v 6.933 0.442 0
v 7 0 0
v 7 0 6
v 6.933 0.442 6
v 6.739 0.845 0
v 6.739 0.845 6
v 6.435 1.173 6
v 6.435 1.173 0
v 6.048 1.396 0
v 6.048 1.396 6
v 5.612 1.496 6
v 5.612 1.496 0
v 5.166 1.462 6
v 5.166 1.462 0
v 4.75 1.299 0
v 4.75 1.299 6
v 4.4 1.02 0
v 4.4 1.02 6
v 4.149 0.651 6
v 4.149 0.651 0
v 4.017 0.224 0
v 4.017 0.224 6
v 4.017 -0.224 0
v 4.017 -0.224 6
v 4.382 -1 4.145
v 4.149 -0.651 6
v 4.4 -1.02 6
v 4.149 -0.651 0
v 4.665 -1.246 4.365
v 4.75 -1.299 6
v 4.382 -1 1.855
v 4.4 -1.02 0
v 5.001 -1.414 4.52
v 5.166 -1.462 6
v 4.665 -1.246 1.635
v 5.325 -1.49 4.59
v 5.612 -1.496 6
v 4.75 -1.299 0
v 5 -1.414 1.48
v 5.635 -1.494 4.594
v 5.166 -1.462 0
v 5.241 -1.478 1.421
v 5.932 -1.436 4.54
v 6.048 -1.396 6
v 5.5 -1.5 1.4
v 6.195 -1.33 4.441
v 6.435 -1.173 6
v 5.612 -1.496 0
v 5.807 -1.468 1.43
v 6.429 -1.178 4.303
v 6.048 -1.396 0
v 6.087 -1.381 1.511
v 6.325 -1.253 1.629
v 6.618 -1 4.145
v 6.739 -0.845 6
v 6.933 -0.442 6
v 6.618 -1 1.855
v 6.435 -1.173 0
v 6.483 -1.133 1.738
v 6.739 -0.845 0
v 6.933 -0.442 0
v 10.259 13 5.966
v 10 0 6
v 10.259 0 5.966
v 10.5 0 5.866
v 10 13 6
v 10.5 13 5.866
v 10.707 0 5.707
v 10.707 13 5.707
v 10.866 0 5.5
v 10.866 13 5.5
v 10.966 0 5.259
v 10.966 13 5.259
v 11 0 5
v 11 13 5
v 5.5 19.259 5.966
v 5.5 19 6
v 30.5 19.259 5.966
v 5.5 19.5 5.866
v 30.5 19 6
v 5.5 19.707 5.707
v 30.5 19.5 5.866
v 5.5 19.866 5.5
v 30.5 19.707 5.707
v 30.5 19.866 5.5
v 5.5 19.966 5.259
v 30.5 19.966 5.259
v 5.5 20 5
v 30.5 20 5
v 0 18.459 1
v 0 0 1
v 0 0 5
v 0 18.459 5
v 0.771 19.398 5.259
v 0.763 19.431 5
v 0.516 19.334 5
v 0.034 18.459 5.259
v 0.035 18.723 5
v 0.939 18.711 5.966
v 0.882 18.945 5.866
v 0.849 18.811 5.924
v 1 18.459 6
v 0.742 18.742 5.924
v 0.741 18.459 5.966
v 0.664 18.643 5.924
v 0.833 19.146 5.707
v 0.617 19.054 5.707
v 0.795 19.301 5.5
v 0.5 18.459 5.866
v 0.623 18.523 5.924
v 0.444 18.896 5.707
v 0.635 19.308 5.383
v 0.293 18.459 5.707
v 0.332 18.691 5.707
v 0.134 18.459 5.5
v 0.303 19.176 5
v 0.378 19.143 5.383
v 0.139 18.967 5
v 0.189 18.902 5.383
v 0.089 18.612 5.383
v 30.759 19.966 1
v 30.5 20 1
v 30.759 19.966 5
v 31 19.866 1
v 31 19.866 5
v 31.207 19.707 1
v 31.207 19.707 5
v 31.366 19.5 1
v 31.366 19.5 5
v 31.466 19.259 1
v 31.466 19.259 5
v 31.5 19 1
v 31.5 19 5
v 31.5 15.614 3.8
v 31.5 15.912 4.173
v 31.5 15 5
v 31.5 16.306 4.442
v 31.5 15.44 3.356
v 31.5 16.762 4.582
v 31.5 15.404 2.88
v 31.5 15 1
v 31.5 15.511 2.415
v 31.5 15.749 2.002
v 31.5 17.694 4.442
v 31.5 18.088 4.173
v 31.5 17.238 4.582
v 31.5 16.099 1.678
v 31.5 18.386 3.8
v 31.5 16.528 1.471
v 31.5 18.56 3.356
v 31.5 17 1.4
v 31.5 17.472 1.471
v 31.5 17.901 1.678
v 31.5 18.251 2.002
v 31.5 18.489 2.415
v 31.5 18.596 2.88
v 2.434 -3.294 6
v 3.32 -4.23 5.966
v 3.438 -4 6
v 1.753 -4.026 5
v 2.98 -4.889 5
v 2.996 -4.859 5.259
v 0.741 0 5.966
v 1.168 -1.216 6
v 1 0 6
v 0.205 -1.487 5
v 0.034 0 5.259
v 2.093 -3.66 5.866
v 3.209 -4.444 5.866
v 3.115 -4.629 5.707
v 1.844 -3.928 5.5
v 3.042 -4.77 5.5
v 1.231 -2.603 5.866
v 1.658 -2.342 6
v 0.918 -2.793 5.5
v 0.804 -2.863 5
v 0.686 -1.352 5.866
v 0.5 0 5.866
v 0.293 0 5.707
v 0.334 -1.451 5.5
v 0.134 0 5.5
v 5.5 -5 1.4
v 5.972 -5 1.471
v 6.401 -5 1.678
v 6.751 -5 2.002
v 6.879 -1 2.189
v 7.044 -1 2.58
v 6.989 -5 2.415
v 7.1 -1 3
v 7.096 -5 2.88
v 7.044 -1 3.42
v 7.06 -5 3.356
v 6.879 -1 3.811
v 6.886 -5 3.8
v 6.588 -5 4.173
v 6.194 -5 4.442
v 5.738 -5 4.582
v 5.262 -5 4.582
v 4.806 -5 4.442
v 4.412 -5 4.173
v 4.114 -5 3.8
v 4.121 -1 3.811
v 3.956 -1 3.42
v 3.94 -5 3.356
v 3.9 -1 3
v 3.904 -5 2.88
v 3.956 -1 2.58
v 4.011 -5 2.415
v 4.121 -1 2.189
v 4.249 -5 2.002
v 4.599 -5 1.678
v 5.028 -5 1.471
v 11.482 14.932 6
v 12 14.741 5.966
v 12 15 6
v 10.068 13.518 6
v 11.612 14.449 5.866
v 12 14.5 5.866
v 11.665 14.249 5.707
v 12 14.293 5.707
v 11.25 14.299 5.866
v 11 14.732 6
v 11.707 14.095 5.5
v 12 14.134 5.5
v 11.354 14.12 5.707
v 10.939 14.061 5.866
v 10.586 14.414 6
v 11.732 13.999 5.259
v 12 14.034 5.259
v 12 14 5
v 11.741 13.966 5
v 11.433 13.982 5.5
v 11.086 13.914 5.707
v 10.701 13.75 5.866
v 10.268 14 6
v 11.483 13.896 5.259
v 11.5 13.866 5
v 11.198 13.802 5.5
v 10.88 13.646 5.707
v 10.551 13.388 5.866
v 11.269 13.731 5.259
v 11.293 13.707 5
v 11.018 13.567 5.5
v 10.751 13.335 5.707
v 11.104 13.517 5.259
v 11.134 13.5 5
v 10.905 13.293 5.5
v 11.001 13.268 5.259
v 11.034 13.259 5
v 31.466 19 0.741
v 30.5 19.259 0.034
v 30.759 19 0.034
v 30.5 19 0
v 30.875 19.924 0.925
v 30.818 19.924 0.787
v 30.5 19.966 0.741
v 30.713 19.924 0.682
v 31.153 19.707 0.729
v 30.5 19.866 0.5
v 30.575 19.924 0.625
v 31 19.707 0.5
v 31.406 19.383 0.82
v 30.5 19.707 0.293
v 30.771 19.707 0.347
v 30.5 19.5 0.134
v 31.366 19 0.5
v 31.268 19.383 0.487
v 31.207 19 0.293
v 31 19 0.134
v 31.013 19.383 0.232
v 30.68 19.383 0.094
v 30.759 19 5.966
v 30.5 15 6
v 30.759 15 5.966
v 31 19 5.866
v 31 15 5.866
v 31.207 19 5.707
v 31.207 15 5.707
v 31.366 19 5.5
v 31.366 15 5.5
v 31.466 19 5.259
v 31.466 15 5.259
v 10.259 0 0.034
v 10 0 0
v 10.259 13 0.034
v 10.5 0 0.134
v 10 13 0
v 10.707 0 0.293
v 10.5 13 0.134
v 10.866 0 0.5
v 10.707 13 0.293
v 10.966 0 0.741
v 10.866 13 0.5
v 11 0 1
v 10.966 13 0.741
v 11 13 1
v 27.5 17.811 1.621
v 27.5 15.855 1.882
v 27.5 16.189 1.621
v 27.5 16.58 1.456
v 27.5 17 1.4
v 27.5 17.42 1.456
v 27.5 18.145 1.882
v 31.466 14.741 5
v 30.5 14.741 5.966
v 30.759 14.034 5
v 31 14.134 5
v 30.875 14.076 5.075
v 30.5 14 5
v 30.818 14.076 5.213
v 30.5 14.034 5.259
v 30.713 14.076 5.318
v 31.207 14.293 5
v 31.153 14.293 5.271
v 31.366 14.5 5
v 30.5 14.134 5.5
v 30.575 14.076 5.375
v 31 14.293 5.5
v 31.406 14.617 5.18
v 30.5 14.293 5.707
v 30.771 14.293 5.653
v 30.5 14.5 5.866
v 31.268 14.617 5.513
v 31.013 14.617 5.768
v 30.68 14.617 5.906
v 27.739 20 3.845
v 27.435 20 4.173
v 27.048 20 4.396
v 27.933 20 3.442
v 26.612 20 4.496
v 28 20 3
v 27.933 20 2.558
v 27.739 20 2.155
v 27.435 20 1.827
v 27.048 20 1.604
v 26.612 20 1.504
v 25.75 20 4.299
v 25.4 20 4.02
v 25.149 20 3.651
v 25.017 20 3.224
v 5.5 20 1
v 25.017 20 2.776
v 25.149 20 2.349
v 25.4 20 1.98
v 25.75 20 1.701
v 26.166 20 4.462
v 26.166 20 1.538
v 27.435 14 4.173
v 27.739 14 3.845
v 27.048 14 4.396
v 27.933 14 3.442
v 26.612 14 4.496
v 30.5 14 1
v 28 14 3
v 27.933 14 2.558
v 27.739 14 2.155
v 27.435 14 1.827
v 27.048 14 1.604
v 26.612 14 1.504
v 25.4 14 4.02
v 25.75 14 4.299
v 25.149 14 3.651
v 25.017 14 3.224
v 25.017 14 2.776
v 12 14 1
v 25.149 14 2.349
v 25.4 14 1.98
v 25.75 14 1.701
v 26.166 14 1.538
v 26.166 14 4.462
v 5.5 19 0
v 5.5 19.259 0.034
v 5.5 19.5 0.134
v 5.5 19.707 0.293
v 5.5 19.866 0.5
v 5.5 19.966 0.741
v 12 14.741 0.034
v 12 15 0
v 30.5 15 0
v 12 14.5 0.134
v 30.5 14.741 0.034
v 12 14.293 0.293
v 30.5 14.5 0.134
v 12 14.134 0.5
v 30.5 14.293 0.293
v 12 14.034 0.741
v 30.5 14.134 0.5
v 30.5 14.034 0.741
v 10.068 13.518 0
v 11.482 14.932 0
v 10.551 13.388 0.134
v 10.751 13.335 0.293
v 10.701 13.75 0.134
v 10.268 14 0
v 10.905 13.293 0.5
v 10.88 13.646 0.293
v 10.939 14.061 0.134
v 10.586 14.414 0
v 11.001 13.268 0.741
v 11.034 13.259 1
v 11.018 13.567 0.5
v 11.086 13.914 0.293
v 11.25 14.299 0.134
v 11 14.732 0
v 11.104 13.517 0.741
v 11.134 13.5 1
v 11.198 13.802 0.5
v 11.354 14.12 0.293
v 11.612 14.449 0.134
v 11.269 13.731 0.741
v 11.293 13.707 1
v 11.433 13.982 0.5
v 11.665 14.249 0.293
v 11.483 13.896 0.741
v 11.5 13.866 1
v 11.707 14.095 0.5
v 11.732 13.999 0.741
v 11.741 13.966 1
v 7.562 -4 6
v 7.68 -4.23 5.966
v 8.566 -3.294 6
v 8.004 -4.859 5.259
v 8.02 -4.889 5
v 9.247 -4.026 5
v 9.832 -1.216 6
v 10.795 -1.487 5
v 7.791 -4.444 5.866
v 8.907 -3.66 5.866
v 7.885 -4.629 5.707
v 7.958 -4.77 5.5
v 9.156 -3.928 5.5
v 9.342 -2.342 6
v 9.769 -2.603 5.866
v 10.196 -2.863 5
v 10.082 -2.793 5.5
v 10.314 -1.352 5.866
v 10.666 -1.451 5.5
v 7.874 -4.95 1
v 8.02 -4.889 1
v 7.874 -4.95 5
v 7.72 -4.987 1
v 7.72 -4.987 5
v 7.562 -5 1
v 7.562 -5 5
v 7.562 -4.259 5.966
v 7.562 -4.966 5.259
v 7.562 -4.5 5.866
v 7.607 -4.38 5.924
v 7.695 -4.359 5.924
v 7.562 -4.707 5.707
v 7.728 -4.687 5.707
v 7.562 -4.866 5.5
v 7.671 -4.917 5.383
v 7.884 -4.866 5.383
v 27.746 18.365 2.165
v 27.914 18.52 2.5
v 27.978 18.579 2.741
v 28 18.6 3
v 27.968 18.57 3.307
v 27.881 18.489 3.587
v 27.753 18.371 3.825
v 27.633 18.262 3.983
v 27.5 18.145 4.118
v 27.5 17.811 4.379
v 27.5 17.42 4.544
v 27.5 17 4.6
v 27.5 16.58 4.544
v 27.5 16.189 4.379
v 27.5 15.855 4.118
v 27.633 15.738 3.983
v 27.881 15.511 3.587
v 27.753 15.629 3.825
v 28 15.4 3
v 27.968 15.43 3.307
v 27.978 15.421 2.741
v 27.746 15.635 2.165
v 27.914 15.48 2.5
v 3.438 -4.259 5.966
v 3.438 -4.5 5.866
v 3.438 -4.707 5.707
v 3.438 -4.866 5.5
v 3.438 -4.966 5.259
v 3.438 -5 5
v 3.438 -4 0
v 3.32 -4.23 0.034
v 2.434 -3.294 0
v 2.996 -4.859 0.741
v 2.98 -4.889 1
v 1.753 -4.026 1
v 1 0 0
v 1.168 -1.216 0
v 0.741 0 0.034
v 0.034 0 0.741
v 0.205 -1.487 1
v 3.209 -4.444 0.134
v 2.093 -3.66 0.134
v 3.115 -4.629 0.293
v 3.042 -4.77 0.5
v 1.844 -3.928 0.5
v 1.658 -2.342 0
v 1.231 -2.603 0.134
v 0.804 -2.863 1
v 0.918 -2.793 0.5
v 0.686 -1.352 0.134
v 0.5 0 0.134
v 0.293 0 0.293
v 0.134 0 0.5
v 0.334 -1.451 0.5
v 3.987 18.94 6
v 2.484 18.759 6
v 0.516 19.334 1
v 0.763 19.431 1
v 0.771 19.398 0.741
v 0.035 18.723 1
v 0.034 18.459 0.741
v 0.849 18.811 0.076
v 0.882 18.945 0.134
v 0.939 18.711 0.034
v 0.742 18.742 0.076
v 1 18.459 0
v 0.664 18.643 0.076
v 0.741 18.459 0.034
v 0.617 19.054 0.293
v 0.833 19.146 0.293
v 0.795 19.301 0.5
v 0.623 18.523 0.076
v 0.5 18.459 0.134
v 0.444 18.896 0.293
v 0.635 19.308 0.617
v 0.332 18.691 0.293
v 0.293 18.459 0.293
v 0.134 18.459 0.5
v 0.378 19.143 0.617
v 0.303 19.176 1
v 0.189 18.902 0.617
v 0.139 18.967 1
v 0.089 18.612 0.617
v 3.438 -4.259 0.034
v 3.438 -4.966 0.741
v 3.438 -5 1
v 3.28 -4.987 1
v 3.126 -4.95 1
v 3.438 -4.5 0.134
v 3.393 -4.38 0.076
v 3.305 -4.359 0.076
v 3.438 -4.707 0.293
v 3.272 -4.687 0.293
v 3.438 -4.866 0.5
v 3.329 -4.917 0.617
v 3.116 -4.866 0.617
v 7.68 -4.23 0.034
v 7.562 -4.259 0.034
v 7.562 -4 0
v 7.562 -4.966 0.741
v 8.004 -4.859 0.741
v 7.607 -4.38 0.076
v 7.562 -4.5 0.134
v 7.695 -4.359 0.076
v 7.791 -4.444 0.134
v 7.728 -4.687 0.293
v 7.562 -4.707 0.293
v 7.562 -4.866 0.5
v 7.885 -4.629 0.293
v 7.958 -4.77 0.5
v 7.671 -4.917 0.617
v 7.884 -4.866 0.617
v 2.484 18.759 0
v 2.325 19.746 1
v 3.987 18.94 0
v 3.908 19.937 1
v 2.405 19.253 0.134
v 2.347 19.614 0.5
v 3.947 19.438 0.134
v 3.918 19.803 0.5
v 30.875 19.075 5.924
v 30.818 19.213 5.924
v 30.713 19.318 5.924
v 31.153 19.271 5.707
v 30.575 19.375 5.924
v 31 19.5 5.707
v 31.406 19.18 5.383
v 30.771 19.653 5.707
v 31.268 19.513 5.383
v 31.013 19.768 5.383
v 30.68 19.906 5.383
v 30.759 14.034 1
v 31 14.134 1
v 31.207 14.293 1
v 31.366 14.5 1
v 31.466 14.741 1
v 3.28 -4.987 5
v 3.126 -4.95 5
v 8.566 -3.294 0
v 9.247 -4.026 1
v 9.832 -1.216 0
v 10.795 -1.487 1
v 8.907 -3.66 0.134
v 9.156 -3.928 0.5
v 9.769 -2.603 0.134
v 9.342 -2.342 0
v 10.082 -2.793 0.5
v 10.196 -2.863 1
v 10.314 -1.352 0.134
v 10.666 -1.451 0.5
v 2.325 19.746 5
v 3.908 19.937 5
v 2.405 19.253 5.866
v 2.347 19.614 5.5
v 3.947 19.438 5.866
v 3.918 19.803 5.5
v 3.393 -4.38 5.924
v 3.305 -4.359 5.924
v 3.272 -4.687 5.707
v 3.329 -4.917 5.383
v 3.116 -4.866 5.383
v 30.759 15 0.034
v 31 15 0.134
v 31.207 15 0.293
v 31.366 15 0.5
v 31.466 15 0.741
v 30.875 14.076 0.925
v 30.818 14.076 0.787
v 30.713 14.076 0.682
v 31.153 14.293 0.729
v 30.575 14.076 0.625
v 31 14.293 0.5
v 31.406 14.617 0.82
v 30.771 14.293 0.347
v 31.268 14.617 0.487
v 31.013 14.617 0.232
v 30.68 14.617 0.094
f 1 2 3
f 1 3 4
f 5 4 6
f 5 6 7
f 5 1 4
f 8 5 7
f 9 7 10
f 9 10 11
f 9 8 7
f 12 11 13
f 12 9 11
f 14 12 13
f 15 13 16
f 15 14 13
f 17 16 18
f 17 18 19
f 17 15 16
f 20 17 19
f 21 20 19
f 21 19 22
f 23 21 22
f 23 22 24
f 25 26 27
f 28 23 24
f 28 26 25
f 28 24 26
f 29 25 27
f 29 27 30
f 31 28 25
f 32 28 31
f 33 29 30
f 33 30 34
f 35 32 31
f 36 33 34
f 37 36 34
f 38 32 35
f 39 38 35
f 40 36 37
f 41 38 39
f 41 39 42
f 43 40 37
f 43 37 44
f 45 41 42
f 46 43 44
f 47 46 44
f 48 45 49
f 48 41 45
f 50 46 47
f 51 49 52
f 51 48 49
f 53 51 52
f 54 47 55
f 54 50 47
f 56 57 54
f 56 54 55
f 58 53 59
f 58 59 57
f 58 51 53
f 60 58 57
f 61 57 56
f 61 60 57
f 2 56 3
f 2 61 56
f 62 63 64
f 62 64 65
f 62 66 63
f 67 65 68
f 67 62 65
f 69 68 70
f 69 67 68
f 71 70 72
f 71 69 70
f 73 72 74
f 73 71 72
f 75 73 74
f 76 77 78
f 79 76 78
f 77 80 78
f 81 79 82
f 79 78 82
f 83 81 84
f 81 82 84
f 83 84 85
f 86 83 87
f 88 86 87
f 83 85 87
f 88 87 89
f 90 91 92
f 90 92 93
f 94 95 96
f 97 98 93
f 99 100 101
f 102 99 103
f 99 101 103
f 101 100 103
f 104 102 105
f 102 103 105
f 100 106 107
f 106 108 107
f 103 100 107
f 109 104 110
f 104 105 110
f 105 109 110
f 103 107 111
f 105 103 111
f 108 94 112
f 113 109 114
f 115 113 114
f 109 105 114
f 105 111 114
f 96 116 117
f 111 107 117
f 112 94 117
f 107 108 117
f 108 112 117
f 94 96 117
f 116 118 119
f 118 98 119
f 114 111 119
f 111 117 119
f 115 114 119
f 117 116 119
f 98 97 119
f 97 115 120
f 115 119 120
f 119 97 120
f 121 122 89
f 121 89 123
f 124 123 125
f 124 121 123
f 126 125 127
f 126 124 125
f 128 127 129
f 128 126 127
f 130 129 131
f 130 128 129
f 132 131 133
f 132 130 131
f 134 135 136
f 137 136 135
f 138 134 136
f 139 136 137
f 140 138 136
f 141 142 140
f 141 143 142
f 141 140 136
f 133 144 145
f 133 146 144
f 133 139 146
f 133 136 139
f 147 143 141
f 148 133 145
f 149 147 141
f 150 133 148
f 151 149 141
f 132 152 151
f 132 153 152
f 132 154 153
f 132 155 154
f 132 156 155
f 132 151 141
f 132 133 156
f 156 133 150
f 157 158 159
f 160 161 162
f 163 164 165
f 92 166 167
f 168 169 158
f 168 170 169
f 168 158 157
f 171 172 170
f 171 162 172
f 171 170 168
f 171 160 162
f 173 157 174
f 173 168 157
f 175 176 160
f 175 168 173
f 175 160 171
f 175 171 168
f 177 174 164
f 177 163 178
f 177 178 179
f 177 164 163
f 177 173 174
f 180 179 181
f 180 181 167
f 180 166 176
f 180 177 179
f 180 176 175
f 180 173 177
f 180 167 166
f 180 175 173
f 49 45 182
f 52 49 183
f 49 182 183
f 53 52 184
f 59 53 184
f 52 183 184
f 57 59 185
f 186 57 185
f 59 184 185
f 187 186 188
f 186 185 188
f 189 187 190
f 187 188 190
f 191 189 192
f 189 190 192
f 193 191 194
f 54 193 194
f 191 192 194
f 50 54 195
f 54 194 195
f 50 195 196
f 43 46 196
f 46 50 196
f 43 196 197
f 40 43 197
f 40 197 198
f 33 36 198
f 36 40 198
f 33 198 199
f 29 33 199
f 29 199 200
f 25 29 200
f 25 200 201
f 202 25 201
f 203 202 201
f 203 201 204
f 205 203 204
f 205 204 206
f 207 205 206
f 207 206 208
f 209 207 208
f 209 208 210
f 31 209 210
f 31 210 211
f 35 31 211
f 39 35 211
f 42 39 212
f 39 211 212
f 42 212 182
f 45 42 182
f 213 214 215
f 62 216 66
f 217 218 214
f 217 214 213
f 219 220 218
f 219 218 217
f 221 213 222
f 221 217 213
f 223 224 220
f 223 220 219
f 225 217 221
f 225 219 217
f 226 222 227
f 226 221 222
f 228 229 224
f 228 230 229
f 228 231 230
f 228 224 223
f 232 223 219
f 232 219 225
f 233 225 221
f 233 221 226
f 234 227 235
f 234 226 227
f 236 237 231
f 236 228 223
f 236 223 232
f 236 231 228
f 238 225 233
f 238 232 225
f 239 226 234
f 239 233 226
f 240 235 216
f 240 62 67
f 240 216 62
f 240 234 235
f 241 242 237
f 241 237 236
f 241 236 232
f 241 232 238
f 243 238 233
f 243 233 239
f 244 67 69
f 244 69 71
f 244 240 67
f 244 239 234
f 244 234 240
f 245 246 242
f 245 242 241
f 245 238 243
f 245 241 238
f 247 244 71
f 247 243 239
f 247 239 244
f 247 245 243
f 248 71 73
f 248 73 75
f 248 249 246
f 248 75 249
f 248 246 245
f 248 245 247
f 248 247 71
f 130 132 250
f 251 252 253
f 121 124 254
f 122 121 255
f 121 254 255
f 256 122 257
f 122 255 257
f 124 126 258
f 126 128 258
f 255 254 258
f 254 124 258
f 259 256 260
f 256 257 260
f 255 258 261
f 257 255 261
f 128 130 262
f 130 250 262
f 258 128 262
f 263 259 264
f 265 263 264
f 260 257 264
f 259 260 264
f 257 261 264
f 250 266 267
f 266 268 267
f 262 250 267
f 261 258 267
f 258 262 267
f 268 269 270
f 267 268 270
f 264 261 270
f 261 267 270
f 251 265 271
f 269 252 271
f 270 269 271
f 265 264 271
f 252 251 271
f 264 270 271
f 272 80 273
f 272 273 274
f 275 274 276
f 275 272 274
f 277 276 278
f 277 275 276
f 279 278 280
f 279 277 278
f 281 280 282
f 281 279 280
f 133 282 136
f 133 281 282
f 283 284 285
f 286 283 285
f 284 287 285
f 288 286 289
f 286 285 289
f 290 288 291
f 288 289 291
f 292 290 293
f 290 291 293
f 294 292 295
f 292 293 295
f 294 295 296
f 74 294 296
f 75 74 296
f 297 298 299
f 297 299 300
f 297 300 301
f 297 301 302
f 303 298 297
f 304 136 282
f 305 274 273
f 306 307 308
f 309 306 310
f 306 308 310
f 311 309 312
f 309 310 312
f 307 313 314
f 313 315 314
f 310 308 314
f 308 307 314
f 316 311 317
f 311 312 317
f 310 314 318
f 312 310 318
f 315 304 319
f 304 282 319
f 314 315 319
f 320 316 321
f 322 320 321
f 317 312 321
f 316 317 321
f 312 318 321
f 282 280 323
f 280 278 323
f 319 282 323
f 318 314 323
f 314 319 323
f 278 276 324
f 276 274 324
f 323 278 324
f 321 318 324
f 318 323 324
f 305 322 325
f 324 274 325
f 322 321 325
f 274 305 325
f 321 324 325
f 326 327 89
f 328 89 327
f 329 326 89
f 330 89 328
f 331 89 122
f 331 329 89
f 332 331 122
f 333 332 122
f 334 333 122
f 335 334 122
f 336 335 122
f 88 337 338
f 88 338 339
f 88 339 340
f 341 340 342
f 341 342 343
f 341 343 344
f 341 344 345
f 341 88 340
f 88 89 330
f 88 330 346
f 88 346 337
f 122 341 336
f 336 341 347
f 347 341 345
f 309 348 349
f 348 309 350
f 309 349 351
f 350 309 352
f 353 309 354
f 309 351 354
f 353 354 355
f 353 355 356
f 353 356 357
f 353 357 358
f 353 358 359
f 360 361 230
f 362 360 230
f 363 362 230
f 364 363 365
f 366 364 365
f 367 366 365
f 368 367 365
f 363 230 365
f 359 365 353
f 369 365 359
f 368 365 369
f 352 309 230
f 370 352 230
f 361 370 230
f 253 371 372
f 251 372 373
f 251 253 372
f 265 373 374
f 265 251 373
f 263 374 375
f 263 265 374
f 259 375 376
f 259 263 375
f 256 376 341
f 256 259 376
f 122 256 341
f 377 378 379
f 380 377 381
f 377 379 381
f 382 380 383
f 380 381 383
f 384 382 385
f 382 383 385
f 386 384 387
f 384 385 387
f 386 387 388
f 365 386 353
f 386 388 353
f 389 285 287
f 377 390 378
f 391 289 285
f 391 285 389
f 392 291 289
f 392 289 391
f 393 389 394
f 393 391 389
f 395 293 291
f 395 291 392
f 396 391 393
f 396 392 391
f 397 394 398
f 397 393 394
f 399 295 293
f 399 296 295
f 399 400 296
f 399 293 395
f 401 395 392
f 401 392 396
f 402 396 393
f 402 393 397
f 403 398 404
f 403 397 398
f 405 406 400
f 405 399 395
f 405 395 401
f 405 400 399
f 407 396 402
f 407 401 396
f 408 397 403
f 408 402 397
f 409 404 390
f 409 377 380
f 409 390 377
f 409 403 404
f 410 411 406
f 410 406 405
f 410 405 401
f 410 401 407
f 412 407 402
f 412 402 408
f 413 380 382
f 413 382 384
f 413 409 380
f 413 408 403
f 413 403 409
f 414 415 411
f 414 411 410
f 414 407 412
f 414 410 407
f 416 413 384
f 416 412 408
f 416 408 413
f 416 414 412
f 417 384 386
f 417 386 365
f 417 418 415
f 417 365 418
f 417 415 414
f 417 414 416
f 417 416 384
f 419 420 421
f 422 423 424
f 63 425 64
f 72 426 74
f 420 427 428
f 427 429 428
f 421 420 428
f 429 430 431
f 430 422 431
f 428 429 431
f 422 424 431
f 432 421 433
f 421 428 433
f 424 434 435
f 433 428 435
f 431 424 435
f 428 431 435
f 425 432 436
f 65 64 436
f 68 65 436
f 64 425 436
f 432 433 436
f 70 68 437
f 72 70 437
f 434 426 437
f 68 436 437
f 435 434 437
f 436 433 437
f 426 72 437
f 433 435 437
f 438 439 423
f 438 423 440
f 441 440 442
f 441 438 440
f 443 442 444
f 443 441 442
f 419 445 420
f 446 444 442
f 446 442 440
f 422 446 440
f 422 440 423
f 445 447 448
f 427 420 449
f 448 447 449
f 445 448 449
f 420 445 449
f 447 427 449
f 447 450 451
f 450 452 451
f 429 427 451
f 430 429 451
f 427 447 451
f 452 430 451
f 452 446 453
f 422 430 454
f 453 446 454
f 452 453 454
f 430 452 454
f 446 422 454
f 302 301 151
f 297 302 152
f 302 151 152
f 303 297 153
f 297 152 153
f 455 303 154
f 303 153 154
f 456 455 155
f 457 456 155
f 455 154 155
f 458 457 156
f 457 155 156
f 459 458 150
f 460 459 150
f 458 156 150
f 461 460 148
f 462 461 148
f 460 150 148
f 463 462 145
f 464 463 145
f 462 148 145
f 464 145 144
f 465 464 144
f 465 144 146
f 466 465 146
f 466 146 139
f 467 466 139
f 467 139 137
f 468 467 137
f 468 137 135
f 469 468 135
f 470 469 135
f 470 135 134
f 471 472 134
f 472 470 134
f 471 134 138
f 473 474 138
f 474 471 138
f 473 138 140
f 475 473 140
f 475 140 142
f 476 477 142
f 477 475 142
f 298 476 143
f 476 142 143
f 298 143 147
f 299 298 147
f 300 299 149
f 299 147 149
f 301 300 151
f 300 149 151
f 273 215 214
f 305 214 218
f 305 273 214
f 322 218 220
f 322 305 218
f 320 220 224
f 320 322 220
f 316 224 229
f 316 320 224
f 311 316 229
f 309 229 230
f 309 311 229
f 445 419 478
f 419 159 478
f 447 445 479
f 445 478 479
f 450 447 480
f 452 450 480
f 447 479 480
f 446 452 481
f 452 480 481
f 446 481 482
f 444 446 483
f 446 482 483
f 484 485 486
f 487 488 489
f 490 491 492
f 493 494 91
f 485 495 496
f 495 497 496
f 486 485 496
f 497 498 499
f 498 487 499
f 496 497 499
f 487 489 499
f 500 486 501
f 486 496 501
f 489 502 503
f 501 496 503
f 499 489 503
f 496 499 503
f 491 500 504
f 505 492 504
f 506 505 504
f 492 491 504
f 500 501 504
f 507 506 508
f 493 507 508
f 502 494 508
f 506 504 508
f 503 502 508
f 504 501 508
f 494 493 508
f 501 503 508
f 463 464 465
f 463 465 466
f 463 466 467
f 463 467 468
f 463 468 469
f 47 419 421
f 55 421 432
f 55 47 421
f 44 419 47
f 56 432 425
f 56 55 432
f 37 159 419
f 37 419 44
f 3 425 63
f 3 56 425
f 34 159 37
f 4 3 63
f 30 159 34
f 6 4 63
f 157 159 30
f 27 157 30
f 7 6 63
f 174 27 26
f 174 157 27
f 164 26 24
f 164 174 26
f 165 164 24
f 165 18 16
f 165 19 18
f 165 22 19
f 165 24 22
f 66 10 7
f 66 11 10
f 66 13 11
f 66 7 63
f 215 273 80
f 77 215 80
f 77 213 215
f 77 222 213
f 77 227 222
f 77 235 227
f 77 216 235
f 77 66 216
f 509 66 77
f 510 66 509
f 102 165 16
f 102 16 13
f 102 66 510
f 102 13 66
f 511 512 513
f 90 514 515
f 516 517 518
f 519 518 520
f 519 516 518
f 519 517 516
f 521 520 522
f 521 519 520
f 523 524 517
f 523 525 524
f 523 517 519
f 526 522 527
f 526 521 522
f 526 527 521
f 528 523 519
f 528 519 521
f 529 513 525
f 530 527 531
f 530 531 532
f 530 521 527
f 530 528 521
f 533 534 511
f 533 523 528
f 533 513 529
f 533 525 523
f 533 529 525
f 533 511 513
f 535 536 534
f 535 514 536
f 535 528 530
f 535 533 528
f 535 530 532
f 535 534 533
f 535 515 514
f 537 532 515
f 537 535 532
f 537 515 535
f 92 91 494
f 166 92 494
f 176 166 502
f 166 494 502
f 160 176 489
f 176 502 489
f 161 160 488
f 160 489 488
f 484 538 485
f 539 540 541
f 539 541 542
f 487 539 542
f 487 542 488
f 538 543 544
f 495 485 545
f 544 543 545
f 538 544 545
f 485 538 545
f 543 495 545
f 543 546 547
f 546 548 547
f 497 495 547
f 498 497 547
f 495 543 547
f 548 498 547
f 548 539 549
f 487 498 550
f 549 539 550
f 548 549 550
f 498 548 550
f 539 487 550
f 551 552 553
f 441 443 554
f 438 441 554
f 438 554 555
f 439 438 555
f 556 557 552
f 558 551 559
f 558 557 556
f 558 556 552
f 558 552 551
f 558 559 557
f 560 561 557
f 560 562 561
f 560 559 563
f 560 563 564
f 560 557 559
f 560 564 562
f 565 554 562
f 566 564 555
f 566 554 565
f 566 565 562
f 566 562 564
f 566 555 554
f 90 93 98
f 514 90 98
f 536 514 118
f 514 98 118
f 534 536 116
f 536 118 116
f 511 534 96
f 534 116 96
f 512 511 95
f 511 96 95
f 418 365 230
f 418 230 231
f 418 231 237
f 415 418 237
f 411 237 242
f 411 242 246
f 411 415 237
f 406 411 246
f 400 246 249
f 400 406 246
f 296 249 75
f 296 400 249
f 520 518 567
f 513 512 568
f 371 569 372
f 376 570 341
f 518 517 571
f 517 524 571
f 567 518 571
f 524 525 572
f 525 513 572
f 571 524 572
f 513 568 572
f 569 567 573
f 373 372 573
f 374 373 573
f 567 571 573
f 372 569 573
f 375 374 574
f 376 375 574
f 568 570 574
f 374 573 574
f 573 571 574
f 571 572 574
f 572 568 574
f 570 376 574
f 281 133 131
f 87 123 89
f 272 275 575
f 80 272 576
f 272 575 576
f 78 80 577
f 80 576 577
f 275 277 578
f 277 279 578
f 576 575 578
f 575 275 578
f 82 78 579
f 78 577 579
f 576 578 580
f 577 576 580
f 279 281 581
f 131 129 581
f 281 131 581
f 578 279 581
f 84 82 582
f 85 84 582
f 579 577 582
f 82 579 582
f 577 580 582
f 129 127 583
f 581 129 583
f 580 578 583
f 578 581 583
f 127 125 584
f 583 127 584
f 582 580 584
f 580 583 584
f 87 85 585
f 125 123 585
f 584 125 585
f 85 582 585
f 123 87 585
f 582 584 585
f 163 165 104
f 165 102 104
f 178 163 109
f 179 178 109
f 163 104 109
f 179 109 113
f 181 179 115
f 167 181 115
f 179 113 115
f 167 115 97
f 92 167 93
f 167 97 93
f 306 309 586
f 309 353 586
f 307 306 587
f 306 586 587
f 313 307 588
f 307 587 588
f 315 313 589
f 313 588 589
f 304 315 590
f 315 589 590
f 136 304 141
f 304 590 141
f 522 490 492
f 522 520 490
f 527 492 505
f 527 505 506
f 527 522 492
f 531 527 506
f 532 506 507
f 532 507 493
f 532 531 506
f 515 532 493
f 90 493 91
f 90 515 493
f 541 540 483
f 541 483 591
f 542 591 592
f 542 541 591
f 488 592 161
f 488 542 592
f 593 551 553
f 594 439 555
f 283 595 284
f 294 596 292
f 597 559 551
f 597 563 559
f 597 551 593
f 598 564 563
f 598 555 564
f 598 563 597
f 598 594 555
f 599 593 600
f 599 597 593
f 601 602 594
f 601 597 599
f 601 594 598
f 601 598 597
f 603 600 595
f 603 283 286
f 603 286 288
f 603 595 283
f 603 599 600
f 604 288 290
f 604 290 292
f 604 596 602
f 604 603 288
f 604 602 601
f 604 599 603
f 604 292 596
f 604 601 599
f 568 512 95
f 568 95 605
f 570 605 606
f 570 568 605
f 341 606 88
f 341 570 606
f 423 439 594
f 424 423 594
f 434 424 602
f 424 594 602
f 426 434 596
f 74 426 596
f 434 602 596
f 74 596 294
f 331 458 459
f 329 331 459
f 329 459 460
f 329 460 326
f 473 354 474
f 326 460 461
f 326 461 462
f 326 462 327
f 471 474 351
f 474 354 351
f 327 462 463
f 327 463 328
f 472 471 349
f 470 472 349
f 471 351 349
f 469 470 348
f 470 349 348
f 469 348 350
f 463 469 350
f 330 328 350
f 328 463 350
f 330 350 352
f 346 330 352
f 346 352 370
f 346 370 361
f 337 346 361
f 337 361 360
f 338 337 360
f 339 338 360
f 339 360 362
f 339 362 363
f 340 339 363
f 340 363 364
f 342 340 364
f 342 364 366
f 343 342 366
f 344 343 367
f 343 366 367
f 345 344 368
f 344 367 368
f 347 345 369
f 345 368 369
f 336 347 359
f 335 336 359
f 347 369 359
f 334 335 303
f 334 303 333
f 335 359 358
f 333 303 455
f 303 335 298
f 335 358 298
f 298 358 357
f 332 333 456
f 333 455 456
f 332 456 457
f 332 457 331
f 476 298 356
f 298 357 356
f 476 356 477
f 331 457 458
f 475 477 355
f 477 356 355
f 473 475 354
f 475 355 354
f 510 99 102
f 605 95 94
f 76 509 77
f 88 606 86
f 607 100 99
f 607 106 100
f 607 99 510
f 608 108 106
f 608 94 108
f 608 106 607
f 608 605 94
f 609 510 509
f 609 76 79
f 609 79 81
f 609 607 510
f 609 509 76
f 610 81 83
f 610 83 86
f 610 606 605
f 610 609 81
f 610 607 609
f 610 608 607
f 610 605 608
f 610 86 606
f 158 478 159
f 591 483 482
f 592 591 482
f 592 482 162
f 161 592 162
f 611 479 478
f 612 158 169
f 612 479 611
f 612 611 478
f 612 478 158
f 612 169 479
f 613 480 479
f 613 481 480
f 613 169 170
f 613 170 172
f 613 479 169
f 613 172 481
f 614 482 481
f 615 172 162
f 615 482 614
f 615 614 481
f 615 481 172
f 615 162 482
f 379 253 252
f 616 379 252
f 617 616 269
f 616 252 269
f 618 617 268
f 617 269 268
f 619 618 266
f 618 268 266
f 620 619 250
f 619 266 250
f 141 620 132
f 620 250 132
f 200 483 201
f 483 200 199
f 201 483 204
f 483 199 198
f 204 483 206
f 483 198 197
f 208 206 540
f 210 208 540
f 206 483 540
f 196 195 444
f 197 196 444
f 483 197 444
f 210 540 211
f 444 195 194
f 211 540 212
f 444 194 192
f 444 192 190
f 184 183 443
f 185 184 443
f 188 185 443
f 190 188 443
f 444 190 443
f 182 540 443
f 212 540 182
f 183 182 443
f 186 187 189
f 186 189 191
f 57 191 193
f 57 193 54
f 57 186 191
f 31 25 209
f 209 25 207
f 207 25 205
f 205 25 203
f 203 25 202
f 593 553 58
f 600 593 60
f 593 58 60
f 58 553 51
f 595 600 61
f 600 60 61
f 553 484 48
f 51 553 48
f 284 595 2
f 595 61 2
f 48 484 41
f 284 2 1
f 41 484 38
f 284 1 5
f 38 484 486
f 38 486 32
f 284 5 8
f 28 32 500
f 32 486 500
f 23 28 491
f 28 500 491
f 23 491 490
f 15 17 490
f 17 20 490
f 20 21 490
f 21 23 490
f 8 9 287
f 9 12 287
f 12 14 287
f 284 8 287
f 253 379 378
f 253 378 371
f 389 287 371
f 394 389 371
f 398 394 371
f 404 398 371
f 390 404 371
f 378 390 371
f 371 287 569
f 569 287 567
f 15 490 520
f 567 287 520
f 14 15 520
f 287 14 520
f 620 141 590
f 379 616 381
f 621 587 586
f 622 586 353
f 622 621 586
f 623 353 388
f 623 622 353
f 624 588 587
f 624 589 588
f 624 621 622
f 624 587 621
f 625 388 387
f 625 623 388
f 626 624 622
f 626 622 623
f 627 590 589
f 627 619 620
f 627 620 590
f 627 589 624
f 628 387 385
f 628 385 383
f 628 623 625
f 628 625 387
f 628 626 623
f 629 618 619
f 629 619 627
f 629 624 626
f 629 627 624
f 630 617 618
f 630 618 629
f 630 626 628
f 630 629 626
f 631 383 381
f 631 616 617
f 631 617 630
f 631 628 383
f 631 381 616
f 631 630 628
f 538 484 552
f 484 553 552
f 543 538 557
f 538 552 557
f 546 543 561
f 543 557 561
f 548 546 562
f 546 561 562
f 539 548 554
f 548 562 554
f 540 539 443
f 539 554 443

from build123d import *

# Parameters (mm, degrees)
SKETCH_1_W          = 11
SKETCH_1_H          = 20
EXTRUDE_1_DEPTH     = 6
CUT_EXTRUDE_1_DEPTH = 6
SKETCH_3_R          = 5.5
EXTRUDE_2_DEPTH     = 6
SKETCH_4_W          = 24
SKETCH_4_H          = 6
EXTRUDE_3_DEPTH     = 6
SKETCH_6_R          = 1.5
CUT_EXTRUDE_3_DEPTH = 6
SKETCH_7_R          = 1.5
CUT_EXTRUDE_4_DEPTH = 6
SKETCH_5_W          = 6
SKETCH_5_H          = 0.5
CUT_EXTRUDE_5_DEPTH = 10
SKETCH_15_W         = 6
SKETCH_15_H         = 6
EXTRUDE_4_DEPTH     = 2
FILLET_2_R          = 1
SKETCH_16_R         = 1.6
CUT_EXTRUDE_7_DEPTH = 4
SKETCH_14_R         = 1.6
CUT_EXTRUDE_8_DEPTH = 4


# Read off the part's stored shape, not the designer's step: 切除-拉伸1
with BuildPart() as part:
    # 草图1 → 凸台-拉伸1 (new body)
    with BuildSketch(Plane.XY):
        with Locations((5.5, 10)):
            Rectangle(SKETCH_1_W, SKETCH_1_H)
    extrude(amount=EXTRUDE_1_DEPTH)

    # 切除-拉伸1 outline → 切除-拉伸1 (cut)
    with BuildSketch(Plane.XY):
        with BuildLine():
            Line((0, 20), (0, 19.228884523))
            ThreePointArc((0, 19.228884523), (2.723103392, 19.806282974), (5.5, 20))
            Line((5.5, 20), (0, 20))
        make_face()
        with BuildLine():
            Line((11, 20), (5.5, 20))
            ThreePointArc((5.5, 20), (8.276896608, 19.806282974), (11, 19.228884523))
            Line((11, 19.228884523), (11, 20))
        make_face()
    extrude(amount=CUT_EXTRUDE_1_DEPTH, mode=Mode.SUBTRACT)

    # 草图3 → 凸台-拉伸2 (add)
    with BuildSketch(Plane.XY):
        with Locations((5.5, 0)):
            Circle(SKETCH_3_R)
    extrude(amount=EXTRUDE_2_DEPTH)

    # 草图4 → 凸台-拉伸3 (add)
    with BuildSketch(Plane.XY):
        with Locations((17.5, 17)):
            Rectangle(SKETCH_4_W, SKETCH_4_H)
    extrude(amount=EXTRUDE_3_DEPTH)

    # 草图6 → 切除-拉伸3 (cut)
    with BuildSketch(Plane.XY):
        with Locations((5.5, 0)):
            Circle(SKETCH_6_R)
    extrude(amount=CUT_EXTRUDE_3_DEPTH, mode=Mode.SUBTRACT)

    # 草图7 → 切除-拉伸4 (cut)
    with BuildSketch(Plane.XZ.offset(-14)):
        with Locations((26.5, 3)):
            Circle(SKETCH_7_R)
    extrude(amount=-CUT_EXTRUDE_4_DEPTH, mode=Mode.SUBTRACT)

    # 草图5 → 切除-拉伸5 (cut)
    with BuildSketch(Plane.XY):
        with Locations((5.5, -5.25)):
            Rectangle(SKETCH_5_W, SKETCH_5_H)
    extrude(amount=CUT_EXTRUDE_5_DEPTH, mode=Mode.SUBTRACT)

    # 草图15 → 凸台-拉伸4 (add)
    with BuildSketch(Plane(origin=(29.5, 0, 0), x_dir=(0, 0, -1), z_dir=(1, 0, 0))):
        with Locations((-3, 17)):
            Rectangle(SKETCH_15_W, SKETCH_15_H)
    extrude(amount=EXTRUDE_4_DEPTH)

    # 圆角2
    fillet_2_edges = [part.edges().sort_by_distance(p)[0] for p in [
        (31.5, 17, 0),
        (31.5, 20, 3),
        (31.5, 17, 6),
        (31.5, 14, 3),
        (11, 7, 6),
        (0, 9.614442262, 0),
        (0, 9.614442262, 6),
        (0, 19.228884523, 3),
        (0.871172764, -2.970514841, 0),
        (0.871172764, -2.970514841, 6),
        (2.723103392, 19.806282974, 6),
        (2.723103392, 19.806282974, 0),
        (11, 14, 3),
        (11, 7, 0),
        (21.25, 14, 0),
        (21.25, 14, 6),
        (18.5, 20, 6),
        (18.5, 20, 0),
        (10.128827236, -2.970514841, 6),
        (10.128827236, -2.970514841, 0),
        (7.791287847, -5, 3),
        (3.208712153, -5, 3),
        (5.5, -5, 0),
        (5.5, -5, 6),
    ]]
    fillet(fillet_2_edges, radius=FILLET_2_R)

    # 草图16 → 切除-拉伸7 (cut)
    with BuildSketch(Plane(origin=(31.5, 0, 0), x_dir=(0, 0, -1), z_dir=(1, 0, 0))):
        with Locations((-3, 17)):
            Circle(SKETCH_16_R)
    extrude(amount=-CUT_EXTRUDE_7_DEPTH, mode=Mode.SUBTRACT)

    # 草图14 → 切除-拉伸8 (cut)
    with BuildSketch(Plane(origin=(0, -5, 0), x_dir=(-1, 0, 0), z_dir=(0, -1, 0))):
        with Locations(Location((-5.5, -3, 0), (0, 0, 90))):
            Circle(SKETCH_14_R)
    extrude(amount=-CUT_EXTRUDE_8_DEPTH, mode=Mode.SUBTRACT)


solid = part.part
